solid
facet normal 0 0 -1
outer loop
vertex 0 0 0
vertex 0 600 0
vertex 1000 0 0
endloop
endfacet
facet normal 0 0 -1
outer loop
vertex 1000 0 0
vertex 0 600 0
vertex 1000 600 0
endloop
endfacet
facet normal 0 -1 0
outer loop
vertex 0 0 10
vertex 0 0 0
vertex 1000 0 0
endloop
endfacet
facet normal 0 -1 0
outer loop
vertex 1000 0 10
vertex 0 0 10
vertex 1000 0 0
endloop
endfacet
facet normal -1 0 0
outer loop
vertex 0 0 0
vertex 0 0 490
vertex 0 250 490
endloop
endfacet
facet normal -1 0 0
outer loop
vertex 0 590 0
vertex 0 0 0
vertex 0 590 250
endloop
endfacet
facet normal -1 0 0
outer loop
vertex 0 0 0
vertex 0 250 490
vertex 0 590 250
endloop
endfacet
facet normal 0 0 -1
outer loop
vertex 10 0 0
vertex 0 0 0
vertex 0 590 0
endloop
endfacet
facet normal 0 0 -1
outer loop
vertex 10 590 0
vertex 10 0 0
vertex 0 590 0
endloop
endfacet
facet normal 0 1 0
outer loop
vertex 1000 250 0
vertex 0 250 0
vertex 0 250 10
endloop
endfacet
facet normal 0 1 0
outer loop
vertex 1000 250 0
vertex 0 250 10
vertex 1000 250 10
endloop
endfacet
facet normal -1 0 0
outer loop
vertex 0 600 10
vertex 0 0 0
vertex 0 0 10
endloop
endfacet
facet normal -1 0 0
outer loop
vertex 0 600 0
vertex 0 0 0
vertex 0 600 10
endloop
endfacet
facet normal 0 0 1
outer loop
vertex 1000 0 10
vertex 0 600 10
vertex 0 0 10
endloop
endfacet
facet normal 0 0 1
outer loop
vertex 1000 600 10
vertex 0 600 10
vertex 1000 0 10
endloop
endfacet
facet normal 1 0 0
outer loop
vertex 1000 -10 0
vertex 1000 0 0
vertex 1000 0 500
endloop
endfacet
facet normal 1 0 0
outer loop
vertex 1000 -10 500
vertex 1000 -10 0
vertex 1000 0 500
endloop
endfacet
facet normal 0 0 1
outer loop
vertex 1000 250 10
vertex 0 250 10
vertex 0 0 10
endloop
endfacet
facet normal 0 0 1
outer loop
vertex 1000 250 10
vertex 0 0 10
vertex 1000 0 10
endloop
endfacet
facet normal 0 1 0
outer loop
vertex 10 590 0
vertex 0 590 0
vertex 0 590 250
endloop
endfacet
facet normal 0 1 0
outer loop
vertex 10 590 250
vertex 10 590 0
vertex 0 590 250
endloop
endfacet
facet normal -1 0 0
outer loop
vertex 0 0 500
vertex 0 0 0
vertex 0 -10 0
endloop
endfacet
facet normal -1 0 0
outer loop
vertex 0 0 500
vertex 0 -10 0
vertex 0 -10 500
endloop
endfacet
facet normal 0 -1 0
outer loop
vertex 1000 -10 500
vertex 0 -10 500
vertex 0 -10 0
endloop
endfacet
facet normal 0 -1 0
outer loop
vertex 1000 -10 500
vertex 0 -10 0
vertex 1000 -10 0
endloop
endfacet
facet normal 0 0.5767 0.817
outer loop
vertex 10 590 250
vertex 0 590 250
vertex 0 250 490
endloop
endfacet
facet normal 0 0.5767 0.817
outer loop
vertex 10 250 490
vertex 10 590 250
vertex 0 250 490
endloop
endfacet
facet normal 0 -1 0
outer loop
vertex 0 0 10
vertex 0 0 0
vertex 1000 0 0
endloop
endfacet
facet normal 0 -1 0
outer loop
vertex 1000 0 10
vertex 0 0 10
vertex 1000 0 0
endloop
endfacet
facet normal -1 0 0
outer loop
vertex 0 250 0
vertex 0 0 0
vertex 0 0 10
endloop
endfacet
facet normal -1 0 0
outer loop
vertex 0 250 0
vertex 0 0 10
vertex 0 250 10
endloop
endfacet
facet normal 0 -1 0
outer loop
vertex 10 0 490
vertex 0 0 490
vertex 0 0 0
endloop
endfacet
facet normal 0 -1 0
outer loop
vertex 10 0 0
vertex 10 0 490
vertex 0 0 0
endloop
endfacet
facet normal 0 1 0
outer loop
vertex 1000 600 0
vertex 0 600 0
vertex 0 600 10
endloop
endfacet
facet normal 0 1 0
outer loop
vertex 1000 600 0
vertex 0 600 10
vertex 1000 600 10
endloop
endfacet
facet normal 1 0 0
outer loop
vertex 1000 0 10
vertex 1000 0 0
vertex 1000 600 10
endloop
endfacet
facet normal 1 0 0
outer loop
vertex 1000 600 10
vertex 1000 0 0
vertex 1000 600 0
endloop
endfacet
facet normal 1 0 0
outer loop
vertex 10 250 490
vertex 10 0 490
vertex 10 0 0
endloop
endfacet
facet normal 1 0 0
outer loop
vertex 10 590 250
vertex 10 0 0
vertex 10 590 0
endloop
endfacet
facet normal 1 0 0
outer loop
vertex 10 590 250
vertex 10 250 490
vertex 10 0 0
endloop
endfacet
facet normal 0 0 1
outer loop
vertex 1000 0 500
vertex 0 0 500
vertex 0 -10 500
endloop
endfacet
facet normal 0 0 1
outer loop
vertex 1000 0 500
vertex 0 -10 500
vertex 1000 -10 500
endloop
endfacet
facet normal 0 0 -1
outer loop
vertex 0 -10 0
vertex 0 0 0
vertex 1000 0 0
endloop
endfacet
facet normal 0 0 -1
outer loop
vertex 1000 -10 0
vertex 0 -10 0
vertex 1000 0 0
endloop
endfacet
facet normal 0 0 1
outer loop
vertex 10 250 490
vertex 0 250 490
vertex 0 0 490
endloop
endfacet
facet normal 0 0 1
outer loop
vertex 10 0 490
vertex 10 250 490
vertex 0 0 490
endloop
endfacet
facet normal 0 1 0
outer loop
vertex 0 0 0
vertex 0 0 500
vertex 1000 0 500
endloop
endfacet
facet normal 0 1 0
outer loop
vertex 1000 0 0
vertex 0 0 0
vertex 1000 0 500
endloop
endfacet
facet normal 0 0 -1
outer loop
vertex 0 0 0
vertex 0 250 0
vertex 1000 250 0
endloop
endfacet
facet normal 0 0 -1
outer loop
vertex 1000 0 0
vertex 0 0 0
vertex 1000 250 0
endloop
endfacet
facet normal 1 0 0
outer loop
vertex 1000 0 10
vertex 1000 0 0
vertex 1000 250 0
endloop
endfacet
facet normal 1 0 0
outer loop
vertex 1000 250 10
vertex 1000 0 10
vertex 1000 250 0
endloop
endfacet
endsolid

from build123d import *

# Parameters (mm, degrees)
F0_W     = 1000
F0_H     = 600
F1_DEPTH = 10
F2_W     = 1000
F2_H     = 500
F3_DEPTH = 10
F5_DEPTH = 10
F6_W     = 1000
F6_H     = 250
F7_DEPTH = 10


with BuildPart() as f1:
    # F0 (on Top) → F1 (new body)
    with BuildSketch(Plane.XY):
        with Locations((500, 300)):
            Rectangle(F0_W, F0_H)
    extrude(amount=F1_DEPTH)


with BuildPart() as f3:
    # F2 (on Front) → F3 (new body)
    with BuildSketch(Plane.XZ):
        with Locations((500, 250)):
            Rectangle(F2_W, F2_H)
    extrude(amount=F3_DEPTH)


with BuildPart() as f5:
    # F4 (on Right) → F5 (new body)
    with BuildSketch(Plane.YZ):
        Polygon((0, 490), (0, 0), (590, 0), (590, 250), (250, 490), align=None)
    extrude(amount=F5_DEPTH)


with BuildPart() as f7:
    # F6 (on Top) → F7 (new body)
    with BuildSketch(Plane.XY):
        with Locations((500, 125)):
            Rectangle(F6_W, F6_H)
    extrude(amount=F7_DEPTH)


solid = Compound([f1.part, f3.part, f5.part, f7.part])
